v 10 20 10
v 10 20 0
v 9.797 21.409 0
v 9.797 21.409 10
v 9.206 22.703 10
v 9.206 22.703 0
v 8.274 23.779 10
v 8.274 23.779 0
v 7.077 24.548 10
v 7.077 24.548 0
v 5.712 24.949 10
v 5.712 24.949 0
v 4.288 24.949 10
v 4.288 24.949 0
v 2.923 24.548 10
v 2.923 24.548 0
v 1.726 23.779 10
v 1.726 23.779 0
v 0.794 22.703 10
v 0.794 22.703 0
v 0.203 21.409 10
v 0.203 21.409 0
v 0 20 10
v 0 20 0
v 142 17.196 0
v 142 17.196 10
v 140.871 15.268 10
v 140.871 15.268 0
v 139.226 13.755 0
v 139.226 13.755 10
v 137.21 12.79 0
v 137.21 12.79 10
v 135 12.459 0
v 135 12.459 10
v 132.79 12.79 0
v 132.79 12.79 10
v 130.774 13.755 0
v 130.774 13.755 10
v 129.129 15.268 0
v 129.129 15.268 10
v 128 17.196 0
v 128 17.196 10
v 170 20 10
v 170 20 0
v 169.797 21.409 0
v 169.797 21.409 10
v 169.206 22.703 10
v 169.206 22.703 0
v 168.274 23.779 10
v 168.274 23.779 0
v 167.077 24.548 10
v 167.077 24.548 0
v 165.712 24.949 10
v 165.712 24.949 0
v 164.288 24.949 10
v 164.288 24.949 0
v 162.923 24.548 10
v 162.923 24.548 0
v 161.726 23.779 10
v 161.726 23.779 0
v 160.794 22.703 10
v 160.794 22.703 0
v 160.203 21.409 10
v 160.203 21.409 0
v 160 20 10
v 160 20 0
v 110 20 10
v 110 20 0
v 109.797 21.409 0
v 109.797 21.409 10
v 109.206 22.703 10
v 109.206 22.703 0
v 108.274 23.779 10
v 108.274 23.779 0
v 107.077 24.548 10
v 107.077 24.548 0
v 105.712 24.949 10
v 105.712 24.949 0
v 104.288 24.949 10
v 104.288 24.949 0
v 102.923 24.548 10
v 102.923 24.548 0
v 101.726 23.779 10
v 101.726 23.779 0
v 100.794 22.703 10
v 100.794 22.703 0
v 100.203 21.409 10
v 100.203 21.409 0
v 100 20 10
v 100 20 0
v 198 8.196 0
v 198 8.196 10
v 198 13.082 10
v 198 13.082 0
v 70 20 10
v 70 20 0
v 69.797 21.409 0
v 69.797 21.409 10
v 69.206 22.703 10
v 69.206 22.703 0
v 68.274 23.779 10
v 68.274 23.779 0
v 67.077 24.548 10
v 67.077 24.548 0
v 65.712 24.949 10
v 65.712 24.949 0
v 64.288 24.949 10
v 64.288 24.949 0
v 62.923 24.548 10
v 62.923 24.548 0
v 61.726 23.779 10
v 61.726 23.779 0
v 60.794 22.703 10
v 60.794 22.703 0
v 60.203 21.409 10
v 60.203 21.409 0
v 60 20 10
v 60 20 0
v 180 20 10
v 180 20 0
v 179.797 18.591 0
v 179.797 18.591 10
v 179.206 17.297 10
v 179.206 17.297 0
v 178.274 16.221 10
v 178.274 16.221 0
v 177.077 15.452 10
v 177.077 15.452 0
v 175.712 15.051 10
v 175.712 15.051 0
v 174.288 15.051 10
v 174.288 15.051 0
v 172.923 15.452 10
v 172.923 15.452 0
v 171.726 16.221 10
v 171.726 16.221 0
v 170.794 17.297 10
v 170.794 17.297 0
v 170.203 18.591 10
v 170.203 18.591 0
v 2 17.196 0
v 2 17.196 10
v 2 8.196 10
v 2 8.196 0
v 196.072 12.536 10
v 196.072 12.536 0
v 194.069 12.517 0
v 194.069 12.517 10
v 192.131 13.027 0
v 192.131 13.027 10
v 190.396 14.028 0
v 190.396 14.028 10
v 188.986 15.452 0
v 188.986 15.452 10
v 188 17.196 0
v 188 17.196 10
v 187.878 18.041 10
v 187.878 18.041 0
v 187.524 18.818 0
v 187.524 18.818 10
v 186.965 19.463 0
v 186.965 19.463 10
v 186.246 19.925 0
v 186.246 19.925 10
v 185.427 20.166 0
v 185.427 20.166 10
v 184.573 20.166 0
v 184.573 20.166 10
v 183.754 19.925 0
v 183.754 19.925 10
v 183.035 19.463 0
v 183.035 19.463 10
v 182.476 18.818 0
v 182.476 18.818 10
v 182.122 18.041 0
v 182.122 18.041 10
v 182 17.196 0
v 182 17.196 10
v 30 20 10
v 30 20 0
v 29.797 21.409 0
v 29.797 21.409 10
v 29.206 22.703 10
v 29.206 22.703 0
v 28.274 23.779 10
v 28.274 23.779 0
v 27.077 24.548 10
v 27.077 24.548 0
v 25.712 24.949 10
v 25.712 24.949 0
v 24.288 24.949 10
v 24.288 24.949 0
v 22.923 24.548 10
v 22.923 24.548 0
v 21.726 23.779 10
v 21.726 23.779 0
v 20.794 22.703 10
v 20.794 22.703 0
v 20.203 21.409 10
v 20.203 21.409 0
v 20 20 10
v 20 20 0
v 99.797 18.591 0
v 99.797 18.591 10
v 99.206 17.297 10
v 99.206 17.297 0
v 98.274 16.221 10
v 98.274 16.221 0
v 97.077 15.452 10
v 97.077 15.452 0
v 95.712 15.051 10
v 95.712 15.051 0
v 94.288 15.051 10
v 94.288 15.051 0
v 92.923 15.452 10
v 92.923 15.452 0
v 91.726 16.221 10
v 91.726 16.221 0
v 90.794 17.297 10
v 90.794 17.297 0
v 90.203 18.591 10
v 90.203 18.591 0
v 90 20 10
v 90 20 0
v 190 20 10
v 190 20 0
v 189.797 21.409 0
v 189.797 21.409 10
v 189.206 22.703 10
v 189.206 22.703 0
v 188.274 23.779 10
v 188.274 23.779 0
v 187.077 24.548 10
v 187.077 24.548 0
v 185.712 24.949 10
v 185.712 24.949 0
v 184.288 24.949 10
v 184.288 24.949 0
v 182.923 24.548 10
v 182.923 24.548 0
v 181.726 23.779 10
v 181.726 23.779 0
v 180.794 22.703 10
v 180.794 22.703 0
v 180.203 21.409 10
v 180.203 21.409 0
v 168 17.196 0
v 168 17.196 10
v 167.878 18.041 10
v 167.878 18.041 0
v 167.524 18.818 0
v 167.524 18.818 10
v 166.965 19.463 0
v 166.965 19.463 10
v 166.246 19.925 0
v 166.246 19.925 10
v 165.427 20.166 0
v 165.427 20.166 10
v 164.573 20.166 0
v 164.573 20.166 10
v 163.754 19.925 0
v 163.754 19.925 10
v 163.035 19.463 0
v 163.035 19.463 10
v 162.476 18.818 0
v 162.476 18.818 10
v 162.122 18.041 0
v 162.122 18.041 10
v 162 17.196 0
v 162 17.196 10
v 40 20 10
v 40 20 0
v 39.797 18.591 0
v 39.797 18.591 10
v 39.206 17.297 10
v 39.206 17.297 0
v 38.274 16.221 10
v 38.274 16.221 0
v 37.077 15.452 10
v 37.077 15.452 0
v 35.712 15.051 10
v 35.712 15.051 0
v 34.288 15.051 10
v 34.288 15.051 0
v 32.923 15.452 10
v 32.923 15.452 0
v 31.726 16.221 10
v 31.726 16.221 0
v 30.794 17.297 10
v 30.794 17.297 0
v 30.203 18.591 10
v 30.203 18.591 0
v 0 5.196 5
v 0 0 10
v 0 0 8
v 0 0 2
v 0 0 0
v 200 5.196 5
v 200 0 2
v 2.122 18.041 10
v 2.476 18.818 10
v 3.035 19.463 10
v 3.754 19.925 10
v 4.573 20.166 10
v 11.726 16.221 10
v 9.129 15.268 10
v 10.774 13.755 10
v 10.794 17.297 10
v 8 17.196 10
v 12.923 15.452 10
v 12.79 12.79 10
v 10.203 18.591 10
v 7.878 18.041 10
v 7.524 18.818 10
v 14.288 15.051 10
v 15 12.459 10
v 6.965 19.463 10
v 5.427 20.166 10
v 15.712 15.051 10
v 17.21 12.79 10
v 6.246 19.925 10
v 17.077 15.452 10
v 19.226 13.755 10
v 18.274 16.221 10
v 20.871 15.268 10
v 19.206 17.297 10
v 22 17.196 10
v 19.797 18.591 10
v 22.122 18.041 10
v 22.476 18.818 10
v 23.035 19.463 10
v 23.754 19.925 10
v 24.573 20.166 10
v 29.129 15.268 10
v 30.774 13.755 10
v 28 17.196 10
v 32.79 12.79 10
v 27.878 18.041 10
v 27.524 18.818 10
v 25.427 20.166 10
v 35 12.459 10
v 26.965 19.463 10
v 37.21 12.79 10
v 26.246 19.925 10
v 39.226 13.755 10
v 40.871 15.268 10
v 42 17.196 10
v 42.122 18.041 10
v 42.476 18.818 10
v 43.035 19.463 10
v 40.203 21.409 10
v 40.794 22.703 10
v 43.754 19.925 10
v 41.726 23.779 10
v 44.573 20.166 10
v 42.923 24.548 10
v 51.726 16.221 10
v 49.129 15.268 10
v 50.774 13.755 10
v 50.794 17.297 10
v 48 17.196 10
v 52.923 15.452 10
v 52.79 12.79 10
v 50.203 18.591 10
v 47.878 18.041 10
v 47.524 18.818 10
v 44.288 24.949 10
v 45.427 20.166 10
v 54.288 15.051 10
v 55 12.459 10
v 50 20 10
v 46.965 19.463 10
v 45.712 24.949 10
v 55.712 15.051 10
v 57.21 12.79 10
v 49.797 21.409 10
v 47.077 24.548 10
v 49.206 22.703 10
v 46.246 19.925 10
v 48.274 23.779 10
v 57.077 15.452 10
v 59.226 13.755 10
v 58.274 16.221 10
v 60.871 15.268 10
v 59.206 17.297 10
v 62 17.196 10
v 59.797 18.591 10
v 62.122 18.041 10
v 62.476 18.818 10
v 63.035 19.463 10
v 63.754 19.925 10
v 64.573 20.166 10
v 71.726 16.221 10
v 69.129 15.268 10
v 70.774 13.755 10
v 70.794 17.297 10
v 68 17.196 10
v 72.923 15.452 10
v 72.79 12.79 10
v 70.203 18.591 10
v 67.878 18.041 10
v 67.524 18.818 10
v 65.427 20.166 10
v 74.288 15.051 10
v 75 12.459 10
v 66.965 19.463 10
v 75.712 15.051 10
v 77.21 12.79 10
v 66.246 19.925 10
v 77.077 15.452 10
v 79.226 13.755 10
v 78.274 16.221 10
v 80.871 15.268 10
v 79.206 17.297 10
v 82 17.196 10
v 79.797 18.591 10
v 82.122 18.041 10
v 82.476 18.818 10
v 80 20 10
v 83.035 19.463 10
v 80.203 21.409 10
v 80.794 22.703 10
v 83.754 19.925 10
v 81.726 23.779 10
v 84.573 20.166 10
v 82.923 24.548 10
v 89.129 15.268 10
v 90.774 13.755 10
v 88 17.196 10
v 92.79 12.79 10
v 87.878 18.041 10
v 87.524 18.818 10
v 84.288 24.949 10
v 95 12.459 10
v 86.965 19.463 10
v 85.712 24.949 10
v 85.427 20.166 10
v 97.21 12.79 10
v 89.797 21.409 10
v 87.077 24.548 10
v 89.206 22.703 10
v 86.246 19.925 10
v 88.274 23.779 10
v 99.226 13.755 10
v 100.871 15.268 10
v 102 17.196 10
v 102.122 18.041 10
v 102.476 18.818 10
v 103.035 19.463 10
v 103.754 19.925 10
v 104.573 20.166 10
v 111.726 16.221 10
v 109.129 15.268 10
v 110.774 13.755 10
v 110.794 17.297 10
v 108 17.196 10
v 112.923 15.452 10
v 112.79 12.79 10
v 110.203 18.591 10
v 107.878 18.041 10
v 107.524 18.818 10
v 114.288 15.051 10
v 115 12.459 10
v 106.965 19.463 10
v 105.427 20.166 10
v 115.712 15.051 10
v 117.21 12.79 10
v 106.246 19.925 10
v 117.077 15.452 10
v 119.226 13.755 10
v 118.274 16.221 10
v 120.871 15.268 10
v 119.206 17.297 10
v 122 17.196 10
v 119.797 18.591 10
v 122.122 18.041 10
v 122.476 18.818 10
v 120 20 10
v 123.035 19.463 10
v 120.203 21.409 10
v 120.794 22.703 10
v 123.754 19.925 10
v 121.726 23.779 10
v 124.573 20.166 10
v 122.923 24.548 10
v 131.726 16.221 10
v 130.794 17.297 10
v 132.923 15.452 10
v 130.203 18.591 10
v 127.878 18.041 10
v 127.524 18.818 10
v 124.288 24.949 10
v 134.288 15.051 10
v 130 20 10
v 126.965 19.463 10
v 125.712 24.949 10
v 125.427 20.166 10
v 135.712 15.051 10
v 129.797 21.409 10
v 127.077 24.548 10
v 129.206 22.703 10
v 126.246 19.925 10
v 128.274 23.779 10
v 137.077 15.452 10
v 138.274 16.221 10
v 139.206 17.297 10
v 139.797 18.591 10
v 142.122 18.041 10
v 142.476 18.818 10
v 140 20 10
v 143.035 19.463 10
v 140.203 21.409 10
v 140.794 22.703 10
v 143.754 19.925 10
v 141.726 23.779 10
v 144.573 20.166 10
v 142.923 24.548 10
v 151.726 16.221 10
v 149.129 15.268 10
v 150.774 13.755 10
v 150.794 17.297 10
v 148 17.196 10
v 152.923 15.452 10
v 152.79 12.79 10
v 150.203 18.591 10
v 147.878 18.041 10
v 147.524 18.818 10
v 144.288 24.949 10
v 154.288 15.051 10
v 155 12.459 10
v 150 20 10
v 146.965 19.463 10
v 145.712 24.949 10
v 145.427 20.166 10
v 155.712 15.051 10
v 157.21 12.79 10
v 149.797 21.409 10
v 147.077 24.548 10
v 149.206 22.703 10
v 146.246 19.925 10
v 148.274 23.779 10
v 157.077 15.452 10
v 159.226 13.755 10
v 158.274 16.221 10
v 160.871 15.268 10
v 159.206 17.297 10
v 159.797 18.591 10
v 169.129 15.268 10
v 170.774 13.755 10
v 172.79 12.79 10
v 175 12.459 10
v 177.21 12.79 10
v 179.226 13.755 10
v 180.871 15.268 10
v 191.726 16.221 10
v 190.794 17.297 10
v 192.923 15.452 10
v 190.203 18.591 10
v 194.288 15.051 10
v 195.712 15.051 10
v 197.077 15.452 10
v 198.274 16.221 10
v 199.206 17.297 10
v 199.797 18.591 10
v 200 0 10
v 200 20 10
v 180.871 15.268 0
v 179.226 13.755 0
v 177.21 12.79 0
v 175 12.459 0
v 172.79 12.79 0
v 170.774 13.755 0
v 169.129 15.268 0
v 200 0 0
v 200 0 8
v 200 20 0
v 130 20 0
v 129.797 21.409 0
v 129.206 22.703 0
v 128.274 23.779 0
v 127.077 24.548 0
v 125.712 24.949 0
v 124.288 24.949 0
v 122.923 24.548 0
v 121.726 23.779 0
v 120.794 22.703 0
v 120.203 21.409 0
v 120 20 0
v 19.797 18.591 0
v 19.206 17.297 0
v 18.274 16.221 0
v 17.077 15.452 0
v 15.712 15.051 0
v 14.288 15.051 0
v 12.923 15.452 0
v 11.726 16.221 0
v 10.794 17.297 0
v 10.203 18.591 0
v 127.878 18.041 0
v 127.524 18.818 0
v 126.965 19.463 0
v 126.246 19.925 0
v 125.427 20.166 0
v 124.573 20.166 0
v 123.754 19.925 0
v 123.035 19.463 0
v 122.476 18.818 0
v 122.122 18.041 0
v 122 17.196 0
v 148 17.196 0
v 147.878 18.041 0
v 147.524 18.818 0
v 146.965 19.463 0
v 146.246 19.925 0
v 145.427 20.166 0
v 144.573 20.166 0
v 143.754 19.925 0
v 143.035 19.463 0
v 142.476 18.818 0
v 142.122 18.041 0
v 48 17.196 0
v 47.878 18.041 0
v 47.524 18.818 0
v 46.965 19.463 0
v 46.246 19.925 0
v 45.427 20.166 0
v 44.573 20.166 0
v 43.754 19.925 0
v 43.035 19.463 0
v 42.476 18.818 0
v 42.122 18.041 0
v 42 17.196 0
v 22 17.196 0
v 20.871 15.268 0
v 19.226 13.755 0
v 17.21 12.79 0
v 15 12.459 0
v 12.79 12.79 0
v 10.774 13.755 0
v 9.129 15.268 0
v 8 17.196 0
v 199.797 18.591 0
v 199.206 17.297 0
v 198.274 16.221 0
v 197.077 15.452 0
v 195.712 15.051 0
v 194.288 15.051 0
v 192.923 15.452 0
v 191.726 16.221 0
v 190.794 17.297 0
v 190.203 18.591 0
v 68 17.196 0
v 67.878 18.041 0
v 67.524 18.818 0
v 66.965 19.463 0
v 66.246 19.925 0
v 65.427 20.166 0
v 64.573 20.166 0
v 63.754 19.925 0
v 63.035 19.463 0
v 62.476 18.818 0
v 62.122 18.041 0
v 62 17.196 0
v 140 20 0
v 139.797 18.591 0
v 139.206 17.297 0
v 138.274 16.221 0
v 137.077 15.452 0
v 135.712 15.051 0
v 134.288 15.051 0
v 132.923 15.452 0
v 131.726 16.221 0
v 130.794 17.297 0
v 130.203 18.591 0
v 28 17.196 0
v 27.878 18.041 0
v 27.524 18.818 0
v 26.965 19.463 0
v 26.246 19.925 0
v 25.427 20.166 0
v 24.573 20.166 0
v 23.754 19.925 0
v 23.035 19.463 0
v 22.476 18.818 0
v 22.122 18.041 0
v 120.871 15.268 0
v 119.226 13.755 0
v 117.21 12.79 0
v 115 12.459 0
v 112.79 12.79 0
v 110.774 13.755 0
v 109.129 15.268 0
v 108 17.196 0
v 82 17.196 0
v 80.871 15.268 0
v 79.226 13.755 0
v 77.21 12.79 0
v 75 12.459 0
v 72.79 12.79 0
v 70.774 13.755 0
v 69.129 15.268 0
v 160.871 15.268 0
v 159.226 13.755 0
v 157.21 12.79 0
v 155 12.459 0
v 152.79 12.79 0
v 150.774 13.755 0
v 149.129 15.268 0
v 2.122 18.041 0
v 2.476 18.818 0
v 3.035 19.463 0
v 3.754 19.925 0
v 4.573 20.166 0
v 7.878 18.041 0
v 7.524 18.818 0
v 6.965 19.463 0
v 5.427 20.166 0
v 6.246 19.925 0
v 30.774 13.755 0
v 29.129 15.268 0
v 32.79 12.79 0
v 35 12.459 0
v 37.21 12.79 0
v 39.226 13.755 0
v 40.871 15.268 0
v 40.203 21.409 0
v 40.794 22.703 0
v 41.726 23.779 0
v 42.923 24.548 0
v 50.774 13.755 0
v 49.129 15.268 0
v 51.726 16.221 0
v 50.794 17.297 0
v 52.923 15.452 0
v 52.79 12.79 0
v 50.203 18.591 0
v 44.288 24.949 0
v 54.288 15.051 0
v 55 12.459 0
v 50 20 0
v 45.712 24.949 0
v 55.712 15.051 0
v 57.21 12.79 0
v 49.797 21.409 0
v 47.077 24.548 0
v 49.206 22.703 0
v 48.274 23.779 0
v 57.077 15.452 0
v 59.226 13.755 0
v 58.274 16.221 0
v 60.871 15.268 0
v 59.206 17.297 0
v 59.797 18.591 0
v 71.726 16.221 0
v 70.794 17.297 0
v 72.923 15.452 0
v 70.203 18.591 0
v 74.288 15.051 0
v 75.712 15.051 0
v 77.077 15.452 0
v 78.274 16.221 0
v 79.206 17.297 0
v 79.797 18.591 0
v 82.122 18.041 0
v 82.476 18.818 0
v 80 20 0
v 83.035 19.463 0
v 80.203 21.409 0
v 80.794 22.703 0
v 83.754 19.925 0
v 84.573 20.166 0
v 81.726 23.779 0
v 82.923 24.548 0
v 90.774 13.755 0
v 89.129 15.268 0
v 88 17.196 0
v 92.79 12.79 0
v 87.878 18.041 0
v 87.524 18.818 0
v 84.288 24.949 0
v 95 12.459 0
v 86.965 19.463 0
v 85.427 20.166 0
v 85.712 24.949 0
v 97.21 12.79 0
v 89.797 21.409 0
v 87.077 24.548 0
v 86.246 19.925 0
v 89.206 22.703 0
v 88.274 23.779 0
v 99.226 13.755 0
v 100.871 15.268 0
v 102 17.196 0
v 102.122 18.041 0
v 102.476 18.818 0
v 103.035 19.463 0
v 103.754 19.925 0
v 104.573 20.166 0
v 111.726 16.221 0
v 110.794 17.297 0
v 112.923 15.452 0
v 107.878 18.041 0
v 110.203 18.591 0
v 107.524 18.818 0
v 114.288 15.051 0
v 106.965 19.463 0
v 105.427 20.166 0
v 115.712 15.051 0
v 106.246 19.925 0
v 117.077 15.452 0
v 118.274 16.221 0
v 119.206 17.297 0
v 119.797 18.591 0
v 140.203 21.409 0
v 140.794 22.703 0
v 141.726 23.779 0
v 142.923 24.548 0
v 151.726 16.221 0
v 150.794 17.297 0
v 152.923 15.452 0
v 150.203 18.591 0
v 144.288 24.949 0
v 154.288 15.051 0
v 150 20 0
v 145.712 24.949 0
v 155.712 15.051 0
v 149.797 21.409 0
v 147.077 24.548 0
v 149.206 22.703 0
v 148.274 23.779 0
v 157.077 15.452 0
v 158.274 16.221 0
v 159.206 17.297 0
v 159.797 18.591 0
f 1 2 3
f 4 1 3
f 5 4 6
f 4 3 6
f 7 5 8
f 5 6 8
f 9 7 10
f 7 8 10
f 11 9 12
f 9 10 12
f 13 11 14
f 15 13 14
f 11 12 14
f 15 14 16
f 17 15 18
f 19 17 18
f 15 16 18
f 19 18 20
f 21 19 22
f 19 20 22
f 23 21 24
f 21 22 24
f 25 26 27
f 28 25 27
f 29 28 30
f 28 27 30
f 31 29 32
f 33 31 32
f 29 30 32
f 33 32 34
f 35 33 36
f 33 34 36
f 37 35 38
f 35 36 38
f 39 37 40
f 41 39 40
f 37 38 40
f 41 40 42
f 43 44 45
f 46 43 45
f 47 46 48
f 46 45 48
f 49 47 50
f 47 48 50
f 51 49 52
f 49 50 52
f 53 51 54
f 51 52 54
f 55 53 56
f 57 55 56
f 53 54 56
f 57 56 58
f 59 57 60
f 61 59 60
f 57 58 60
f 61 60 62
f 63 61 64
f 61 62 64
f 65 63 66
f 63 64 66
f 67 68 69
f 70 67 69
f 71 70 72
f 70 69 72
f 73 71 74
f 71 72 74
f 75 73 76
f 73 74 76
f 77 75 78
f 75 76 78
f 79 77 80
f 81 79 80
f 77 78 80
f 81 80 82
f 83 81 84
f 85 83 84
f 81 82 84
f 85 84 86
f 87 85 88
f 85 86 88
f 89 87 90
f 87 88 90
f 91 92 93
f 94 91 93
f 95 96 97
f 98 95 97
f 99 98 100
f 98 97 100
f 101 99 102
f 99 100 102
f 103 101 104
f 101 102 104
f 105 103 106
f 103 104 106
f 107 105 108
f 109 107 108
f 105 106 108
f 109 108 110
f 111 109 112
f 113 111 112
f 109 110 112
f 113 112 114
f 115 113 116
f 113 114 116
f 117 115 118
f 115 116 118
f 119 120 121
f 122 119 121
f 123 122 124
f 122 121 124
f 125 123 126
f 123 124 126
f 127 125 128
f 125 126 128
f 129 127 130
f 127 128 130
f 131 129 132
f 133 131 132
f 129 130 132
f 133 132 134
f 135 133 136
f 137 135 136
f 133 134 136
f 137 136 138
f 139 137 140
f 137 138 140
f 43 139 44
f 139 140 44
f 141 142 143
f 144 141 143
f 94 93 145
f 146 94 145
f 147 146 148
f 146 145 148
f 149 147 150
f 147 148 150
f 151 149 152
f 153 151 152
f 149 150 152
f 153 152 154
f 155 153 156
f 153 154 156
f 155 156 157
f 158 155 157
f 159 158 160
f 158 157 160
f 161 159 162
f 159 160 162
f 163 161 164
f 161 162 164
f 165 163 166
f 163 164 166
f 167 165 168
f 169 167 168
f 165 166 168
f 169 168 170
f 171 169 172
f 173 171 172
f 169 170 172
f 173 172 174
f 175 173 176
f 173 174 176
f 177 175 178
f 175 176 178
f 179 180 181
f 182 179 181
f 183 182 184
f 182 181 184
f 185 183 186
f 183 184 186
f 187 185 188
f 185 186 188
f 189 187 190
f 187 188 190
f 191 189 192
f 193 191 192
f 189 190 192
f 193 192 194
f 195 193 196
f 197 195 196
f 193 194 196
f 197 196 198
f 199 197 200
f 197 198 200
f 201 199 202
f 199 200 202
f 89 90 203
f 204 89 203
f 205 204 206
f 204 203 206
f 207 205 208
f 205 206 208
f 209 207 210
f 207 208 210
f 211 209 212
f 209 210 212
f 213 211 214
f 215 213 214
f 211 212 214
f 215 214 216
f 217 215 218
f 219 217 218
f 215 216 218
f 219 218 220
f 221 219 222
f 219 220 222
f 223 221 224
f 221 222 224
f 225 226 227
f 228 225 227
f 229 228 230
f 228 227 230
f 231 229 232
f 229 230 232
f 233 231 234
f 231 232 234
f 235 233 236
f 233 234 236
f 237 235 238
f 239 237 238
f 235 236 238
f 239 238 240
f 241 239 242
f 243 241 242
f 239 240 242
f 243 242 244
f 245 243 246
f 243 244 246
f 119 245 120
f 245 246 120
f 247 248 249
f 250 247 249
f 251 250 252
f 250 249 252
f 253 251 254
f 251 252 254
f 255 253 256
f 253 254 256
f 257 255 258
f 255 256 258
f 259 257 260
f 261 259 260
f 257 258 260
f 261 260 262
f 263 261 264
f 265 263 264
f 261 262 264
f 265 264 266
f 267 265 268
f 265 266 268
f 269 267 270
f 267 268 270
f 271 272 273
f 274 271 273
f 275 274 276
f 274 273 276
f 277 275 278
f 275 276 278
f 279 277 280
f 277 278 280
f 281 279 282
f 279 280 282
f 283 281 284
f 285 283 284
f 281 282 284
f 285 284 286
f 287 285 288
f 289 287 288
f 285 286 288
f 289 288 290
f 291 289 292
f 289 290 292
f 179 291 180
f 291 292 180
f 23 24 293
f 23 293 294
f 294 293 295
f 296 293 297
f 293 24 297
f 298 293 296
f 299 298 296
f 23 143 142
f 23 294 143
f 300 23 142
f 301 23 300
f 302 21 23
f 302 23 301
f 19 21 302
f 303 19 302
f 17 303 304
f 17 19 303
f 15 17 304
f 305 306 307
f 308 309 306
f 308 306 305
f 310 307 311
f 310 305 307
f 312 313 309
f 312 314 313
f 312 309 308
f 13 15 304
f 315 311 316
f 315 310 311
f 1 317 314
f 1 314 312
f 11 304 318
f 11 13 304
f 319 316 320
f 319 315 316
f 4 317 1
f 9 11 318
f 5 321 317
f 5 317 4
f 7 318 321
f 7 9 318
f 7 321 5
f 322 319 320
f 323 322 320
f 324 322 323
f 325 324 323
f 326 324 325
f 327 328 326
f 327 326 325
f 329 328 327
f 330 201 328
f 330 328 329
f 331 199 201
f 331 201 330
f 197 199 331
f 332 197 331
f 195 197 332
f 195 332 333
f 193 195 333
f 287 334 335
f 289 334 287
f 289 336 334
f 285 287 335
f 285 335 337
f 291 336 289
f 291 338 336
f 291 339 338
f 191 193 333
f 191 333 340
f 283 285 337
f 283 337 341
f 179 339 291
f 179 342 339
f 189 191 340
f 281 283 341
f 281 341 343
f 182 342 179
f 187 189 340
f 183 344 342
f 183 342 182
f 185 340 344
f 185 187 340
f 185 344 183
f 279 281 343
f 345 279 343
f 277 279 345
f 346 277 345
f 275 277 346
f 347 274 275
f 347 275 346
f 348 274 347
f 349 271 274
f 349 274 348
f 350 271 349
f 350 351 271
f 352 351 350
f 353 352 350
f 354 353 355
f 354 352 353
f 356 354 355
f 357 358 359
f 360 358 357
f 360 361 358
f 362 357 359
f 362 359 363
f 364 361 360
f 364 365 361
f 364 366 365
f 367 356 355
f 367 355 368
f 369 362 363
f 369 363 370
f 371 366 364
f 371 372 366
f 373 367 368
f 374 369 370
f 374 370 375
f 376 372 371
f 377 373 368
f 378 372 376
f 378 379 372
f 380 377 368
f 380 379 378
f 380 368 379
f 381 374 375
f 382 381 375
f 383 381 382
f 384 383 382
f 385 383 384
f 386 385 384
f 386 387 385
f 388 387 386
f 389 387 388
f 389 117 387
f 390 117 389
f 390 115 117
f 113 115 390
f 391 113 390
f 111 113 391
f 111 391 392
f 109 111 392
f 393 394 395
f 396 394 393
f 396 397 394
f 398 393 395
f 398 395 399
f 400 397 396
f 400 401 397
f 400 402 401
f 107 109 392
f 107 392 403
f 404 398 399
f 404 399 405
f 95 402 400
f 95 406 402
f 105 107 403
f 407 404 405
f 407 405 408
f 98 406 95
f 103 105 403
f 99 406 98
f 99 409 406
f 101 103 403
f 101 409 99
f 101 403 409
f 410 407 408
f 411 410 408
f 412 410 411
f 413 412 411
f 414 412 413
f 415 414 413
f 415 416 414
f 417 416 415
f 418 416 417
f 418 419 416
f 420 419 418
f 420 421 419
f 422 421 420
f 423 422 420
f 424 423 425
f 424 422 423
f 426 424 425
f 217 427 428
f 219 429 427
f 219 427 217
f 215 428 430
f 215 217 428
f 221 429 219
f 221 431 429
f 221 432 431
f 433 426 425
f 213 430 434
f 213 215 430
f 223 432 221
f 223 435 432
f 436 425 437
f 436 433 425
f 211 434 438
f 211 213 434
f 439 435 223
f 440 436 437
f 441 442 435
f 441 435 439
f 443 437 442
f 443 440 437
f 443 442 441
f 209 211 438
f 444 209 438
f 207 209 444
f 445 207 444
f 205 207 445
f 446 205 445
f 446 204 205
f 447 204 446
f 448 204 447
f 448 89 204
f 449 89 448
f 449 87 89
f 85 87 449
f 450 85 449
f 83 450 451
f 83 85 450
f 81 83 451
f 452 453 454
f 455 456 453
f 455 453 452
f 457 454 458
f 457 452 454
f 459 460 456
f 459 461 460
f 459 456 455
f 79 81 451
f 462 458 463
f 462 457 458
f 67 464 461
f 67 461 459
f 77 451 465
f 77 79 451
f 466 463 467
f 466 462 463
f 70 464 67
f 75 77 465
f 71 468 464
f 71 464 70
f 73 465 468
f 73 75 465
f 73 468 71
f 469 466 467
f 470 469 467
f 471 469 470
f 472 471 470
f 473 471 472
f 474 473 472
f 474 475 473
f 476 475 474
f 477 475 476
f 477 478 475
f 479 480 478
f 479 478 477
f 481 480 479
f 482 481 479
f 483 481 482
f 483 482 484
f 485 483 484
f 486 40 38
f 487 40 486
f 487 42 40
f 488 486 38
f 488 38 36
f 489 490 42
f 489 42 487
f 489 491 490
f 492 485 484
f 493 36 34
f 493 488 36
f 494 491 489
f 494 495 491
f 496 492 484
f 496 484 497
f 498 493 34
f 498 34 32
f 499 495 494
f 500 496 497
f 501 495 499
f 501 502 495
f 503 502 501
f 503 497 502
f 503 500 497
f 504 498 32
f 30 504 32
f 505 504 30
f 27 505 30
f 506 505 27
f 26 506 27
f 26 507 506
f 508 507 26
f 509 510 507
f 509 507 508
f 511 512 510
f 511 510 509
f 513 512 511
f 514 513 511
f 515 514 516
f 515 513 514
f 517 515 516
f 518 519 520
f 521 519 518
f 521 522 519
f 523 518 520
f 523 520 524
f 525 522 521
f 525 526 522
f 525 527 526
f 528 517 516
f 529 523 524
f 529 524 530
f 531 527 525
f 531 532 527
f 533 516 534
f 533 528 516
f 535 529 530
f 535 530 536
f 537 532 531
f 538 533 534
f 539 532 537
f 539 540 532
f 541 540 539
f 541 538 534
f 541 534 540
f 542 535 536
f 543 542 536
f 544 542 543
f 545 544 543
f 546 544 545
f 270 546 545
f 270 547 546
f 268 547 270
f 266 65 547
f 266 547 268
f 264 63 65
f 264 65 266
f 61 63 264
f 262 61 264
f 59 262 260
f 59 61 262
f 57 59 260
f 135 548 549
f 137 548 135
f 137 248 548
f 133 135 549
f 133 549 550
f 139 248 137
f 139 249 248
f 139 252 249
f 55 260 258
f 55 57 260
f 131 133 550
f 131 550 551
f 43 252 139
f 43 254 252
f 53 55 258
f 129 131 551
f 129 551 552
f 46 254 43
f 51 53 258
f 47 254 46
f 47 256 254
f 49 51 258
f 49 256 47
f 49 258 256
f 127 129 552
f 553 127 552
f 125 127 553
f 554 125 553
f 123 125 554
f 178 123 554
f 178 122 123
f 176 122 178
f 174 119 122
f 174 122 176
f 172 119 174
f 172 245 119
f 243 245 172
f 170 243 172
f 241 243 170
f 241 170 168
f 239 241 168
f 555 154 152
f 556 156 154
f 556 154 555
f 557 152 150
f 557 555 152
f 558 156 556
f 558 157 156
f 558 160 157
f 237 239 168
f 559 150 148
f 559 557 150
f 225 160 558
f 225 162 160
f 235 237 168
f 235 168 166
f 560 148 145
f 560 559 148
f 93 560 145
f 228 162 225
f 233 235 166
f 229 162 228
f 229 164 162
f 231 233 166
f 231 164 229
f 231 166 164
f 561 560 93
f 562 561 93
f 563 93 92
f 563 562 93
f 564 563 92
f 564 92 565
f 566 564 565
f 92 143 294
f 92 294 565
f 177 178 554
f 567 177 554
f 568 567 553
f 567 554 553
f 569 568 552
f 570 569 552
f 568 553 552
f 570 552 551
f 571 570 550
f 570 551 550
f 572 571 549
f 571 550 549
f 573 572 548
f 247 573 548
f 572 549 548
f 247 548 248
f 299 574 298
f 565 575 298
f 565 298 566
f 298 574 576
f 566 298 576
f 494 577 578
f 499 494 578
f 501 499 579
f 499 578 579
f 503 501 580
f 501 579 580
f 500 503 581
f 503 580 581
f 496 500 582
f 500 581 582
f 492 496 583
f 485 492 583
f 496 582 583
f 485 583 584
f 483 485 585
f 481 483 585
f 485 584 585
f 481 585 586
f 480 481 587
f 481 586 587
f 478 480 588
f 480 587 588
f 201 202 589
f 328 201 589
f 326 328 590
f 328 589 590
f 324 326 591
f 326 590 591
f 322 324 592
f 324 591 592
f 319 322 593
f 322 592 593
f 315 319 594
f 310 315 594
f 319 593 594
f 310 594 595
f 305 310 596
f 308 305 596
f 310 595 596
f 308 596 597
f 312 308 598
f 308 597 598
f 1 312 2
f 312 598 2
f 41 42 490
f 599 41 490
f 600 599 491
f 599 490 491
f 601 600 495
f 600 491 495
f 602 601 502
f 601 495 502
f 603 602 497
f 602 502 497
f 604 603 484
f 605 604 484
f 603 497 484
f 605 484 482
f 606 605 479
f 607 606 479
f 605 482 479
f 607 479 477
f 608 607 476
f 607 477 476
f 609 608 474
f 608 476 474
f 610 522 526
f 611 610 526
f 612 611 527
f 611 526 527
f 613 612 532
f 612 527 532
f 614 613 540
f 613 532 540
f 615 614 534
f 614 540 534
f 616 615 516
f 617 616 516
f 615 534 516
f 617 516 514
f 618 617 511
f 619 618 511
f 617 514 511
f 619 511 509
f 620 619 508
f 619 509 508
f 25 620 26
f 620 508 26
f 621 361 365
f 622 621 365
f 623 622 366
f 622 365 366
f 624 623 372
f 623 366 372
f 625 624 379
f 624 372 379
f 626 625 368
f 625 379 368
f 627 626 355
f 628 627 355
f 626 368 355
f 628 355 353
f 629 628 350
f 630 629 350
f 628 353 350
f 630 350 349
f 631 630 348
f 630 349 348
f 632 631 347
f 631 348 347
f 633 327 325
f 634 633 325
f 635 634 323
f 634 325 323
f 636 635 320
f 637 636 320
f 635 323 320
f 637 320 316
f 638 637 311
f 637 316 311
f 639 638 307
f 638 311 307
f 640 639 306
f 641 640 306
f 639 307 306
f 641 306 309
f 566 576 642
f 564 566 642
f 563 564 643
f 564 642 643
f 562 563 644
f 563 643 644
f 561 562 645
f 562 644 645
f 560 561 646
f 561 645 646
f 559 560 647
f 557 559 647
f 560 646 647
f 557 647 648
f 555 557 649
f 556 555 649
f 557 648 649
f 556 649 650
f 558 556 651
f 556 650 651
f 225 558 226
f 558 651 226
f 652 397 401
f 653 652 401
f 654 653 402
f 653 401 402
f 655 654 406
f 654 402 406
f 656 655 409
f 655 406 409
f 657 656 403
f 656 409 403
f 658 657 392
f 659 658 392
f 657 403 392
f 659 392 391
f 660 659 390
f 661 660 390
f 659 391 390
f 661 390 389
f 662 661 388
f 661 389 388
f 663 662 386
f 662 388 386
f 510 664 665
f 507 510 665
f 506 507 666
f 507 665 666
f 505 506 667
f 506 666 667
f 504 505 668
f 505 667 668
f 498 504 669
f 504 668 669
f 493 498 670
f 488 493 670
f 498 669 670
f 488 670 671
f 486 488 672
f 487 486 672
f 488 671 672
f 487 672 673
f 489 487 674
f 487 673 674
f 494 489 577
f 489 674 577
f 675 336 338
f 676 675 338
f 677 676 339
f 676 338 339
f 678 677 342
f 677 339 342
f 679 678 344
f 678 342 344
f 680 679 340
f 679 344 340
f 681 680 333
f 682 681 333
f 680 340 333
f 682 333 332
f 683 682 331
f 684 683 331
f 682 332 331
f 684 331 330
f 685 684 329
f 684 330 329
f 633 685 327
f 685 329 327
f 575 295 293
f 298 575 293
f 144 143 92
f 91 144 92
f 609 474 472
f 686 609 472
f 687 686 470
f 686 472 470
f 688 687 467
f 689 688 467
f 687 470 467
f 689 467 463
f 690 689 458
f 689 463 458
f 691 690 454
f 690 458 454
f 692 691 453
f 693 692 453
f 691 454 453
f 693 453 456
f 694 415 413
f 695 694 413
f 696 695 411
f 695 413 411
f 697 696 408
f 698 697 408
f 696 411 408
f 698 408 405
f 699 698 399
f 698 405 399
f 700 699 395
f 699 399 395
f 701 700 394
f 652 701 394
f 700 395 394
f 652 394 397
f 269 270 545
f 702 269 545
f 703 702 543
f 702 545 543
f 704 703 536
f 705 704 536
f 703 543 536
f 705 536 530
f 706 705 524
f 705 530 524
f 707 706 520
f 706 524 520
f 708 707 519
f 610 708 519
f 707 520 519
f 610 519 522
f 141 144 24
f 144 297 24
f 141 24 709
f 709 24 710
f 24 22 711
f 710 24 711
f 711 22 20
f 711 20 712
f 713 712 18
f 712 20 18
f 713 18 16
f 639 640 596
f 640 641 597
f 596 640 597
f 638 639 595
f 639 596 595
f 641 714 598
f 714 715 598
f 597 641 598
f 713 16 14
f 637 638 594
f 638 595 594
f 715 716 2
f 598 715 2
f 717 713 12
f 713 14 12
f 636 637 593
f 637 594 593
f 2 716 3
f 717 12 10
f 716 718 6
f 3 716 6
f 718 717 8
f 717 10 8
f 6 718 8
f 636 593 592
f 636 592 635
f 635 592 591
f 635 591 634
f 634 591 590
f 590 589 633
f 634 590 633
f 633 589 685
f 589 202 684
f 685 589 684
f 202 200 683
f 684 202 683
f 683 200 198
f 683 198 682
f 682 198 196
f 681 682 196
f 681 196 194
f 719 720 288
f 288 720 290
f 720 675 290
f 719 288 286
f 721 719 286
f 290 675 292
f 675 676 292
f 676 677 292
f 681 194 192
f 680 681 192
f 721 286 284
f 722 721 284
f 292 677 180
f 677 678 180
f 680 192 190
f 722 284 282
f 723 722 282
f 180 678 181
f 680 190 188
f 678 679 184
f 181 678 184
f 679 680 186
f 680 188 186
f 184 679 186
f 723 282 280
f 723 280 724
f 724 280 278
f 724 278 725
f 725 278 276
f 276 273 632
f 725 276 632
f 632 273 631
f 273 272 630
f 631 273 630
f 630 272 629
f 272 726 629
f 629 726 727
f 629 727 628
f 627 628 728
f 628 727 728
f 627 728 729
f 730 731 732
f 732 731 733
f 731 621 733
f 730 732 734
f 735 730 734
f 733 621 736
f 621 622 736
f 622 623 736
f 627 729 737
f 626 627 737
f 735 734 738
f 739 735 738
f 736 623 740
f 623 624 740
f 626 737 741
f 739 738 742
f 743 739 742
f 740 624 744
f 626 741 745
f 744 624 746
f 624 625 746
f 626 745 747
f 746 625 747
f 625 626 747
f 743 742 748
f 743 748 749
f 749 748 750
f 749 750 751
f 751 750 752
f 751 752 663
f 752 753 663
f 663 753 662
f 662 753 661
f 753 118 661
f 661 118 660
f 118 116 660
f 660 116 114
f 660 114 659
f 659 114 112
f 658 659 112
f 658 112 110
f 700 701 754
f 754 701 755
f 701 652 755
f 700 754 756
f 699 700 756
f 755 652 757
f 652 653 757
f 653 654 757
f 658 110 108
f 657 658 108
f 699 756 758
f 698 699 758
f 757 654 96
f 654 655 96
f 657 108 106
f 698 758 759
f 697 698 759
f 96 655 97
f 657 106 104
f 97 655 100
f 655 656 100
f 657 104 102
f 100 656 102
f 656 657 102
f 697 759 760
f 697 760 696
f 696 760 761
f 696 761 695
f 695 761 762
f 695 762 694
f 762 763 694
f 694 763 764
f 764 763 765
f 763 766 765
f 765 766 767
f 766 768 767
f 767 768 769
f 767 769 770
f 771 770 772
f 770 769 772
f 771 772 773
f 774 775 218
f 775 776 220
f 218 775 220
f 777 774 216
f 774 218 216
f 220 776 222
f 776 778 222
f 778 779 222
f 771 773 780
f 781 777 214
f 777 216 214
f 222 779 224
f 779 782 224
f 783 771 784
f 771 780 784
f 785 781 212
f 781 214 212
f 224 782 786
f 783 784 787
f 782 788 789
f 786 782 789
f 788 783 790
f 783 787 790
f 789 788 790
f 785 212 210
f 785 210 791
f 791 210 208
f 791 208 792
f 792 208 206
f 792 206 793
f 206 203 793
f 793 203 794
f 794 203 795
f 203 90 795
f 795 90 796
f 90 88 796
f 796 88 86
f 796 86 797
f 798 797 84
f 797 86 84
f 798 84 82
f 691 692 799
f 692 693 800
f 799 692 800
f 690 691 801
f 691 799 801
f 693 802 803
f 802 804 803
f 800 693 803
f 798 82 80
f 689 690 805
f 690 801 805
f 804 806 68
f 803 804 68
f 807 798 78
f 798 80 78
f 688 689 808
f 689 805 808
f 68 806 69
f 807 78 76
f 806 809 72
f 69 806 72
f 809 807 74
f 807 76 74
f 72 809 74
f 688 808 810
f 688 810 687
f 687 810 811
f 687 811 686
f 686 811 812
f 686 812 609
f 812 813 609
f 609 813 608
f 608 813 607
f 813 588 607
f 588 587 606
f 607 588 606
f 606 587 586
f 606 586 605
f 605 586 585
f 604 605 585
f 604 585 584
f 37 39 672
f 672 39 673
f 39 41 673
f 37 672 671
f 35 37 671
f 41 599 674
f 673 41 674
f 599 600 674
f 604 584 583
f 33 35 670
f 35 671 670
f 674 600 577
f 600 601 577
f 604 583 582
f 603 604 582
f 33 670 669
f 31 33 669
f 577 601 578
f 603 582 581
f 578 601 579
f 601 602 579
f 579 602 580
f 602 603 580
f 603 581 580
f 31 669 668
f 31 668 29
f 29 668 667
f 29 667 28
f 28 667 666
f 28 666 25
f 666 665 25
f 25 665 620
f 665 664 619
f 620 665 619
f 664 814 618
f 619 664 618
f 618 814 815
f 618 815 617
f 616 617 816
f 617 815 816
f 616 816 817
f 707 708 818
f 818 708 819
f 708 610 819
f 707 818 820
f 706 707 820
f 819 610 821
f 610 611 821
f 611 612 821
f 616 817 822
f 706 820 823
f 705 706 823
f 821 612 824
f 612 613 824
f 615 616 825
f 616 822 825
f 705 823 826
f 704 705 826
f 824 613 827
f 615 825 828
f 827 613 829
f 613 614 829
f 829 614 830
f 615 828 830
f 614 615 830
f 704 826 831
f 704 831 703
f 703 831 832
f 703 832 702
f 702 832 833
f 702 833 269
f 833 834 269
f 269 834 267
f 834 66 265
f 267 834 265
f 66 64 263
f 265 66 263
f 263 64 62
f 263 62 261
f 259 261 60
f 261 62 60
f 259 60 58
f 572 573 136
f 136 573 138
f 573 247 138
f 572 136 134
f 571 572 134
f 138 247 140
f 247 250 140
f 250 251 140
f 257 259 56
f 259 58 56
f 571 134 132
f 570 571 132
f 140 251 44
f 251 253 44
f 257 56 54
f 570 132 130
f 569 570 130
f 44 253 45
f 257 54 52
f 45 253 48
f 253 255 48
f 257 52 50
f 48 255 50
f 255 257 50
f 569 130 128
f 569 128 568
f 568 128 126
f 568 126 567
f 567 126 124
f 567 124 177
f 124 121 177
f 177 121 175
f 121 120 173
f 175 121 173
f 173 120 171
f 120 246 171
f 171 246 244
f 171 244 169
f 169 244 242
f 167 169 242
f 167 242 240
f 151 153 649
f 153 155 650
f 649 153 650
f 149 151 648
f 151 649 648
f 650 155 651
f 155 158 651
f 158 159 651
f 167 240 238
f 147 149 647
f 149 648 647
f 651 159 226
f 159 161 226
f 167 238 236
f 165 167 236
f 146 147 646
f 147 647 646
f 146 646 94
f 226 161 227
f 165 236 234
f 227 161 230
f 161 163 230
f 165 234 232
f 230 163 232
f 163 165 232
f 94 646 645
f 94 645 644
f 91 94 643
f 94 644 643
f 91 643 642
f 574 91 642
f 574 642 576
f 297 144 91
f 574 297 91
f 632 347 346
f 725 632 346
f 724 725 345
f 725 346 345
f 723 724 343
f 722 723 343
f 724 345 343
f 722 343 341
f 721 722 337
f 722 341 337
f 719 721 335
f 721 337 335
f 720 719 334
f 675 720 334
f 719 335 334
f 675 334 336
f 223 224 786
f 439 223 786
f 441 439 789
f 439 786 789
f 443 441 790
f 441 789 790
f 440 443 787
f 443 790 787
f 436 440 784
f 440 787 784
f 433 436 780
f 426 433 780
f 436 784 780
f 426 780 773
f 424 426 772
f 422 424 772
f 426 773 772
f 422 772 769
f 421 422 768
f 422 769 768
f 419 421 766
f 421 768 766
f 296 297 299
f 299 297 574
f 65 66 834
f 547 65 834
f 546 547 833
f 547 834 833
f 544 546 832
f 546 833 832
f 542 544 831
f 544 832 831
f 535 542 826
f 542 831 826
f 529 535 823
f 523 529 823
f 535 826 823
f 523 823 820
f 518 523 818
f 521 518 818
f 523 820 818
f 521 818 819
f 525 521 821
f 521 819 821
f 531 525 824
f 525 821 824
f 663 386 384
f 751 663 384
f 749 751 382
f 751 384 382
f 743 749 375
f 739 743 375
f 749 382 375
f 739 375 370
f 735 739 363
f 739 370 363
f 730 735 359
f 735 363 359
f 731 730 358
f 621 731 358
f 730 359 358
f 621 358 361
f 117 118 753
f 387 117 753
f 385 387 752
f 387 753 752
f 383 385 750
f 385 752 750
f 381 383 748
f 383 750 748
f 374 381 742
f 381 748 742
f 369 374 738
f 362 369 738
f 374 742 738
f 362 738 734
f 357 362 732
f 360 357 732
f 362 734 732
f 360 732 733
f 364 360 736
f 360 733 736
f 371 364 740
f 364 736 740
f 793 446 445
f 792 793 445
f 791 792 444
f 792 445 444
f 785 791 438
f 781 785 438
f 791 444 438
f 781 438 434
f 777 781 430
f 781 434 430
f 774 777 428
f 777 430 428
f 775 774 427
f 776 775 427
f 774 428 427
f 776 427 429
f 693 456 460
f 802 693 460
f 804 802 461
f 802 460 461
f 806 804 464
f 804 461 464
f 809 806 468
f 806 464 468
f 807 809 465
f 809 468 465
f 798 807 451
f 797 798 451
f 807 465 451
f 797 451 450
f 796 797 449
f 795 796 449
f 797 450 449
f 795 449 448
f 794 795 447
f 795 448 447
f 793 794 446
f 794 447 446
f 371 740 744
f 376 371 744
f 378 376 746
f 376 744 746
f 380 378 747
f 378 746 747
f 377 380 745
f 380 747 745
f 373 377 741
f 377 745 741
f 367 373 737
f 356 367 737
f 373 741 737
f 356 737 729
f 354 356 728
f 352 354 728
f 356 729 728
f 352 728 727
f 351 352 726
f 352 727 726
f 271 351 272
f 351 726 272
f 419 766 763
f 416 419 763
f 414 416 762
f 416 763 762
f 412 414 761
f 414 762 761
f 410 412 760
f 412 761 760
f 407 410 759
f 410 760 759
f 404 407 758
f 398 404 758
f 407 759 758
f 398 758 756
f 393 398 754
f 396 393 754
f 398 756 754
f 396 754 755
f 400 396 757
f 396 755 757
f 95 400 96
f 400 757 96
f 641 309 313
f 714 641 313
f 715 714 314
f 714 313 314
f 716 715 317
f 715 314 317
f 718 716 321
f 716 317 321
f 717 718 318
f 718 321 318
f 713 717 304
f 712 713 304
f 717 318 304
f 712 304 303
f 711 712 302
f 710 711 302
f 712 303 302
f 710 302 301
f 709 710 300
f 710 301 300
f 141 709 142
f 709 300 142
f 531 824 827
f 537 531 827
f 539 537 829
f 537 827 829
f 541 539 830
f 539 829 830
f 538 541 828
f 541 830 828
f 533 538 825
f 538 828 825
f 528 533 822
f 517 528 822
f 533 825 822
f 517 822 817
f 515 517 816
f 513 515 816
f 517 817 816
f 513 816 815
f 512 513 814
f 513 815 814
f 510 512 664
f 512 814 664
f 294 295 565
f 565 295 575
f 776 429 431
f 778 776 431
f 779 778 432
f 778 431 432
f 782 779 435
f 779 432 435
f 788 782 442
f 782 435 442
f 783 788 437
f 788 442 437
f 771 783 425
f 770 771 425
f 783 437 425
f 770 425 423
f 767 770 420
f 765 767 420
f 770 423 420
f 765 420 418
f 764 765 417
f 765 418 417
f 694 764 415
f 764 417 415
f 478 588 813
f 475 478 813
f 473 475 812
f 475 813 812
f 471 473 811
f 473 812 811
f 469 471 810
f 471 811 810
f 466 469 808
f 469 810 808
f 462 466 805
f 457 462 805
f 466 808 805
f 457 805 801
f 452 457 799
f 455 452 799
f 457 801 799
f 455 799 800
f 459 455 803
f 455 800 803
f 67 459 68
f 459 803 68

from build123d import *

# Parameters (mm, degrees)
F1_DEPTH = 10
F3_DEPTH = 200.001
F5_DEPTH = 10


with BuildPart() as f1:
    # F0 (on Top) → F1 (new body)
    with BuildSketch(Plane.XY):
        with BuildLine():
            ThreePointArc((20, 20), (15, 15), (10, 20))
            ThreePointArc((10, 20), (5, 25), (0, 20))
            Line((0, 20), (0, 0))
            Line((0, 0), (200, 0))
            Line((200, 0), (200, 20))
            ThreePointArc((200, 20), (195, 15), (190, 20))
            ThreePointArc((190, 20), (185, 25), (180, 20))
            ThreePointArc((180, 20), (175, 15), (170, 20))
            ThreePointArc((170, 20), (165, 25), (160, 20))
            ThreePointArc((160, 20), (155, 15), (150, 20))
            ThreePointArc((150, 20), (145, 25), (140, 20))
            ThreePointArc((140, 20), (135, 15), (130, 20))
            ThreePointArc((130, 20), (125, 25), (120, 20))
            ThreePointArc((120, 20), (115, 15), (110, 20))
            ThreePointArc((110, 20), (105, 25), (100, 20))
            ThreePointArc((100, 20), (95, 15), (90, 20))
            ThreePointArc((90, 20), (85, 25), (80, 20))
            ThreePointArc((80, 20), (75, 15), (70, 20))
            ThreePointArc((70, 20), (65, 25), (60, 20))
            ThreePointArc((60, 20), (55, 15), (50, 20))
            ThreePointArc((50, 20), (45, 25), (40, 20))
            ThreePointArc((40, 20), (35, 15), (30, 20))
            ThreePointArc((30, 20), (25, 25), (20, 20))
        make_face()
    extrude(amount=F1_DEPTH)

    # F2 (on face) → F3 (cut, through all)
    with BuildSketch(Plane(origin=(0, 0, 0), x_dir=(0, -1, 0), z_dir=(-1, 0, 0))):
        Polygon((0, 2), (0, 8), (-5.196152, 5), align=None)
    extrude(amount=-F3_DEPTH, mode=Mode.SUBTRACT)

    # F4 (on face) → F5 (cut, through all)
    with BuildSketch(Plane.XY.offset(10)):
        with BuildLine():
            ThreePointArc((8, 17.196152), (5, 20.196152), (2, 17.196152))
            Line((2, 17.196152), (2, 8.196152))
            Line((2, 8.196152), (14.824948, 8.196152))
            Line((14.824948, 8.196152), (28, 8.196152))
            Line((28, 8.196152), (198, 8.196152))
            Line((198, 8.196152), (198, 13.081795))
            ThreePointArc((198, 13.081795), (192.130857, 13.026509), (188, 17.196152))
            ThreePointArc((188, 17.196152), (185, 20.196152), (182, 17.196152))
            ThreePointArc((182, 17.196152), (175, 12.459339), (168, 17.196152))
            ThreePointArc((168, 17.196152), (165, 20.196152), (162, 17.196152))
            ThreePointArc((162, 17.196152), (155, 12.459339), (148, 17.196152))
            ThreePointArc((148, 17.196152), (145, 20.196152), (142, 17.196152))
            ThreePointArc((142, 17.196152), (135, 12.459339), (128, 17.196152))
            ThreePointArc((128, 17.196152), (125, 20.196152), (122, 17.196152))
            ThreePointArc((122, 17.196152), (115, 12.459339), (108, 17.196152))
            ThreePointArc((108, 17.196152), (105, 20.196152), (102, 17.196152))
            ThreePointArc((102, 17.196152), (95, 12.459339), (88, 17.196152))
            ThreePointArc((88, 17.196152), (85, 20.196152), (82, 17.196152))
            ThreePointArc((82, 17.196152), (75, 12.459339), (68, 17.196152))
            ThreePointArc((68, 17.196152), (65, 20.196152), (62, 17.196152))
            ThreePointArc((62, 17.196152), (55, 12.459339), (48, 17.196152))
            ThreePointArc((48, 17.196152), (45, 20.196152), (42, 17.196152))
            ThreePointArc((42, 17.196152), (35, 12.459339), (28, 17.196152))
            ThreePointArc((28, 17.196152), (25, 20.196152), (22, 17.196152))
            ThreePointArc((22, 17.196152), (15, 12.459339), (8, 17.196152))
        make_face()
    extrude(amount=-F5_DEPTH, mode=Mode.SUBTRACT)


solid = f1.part
